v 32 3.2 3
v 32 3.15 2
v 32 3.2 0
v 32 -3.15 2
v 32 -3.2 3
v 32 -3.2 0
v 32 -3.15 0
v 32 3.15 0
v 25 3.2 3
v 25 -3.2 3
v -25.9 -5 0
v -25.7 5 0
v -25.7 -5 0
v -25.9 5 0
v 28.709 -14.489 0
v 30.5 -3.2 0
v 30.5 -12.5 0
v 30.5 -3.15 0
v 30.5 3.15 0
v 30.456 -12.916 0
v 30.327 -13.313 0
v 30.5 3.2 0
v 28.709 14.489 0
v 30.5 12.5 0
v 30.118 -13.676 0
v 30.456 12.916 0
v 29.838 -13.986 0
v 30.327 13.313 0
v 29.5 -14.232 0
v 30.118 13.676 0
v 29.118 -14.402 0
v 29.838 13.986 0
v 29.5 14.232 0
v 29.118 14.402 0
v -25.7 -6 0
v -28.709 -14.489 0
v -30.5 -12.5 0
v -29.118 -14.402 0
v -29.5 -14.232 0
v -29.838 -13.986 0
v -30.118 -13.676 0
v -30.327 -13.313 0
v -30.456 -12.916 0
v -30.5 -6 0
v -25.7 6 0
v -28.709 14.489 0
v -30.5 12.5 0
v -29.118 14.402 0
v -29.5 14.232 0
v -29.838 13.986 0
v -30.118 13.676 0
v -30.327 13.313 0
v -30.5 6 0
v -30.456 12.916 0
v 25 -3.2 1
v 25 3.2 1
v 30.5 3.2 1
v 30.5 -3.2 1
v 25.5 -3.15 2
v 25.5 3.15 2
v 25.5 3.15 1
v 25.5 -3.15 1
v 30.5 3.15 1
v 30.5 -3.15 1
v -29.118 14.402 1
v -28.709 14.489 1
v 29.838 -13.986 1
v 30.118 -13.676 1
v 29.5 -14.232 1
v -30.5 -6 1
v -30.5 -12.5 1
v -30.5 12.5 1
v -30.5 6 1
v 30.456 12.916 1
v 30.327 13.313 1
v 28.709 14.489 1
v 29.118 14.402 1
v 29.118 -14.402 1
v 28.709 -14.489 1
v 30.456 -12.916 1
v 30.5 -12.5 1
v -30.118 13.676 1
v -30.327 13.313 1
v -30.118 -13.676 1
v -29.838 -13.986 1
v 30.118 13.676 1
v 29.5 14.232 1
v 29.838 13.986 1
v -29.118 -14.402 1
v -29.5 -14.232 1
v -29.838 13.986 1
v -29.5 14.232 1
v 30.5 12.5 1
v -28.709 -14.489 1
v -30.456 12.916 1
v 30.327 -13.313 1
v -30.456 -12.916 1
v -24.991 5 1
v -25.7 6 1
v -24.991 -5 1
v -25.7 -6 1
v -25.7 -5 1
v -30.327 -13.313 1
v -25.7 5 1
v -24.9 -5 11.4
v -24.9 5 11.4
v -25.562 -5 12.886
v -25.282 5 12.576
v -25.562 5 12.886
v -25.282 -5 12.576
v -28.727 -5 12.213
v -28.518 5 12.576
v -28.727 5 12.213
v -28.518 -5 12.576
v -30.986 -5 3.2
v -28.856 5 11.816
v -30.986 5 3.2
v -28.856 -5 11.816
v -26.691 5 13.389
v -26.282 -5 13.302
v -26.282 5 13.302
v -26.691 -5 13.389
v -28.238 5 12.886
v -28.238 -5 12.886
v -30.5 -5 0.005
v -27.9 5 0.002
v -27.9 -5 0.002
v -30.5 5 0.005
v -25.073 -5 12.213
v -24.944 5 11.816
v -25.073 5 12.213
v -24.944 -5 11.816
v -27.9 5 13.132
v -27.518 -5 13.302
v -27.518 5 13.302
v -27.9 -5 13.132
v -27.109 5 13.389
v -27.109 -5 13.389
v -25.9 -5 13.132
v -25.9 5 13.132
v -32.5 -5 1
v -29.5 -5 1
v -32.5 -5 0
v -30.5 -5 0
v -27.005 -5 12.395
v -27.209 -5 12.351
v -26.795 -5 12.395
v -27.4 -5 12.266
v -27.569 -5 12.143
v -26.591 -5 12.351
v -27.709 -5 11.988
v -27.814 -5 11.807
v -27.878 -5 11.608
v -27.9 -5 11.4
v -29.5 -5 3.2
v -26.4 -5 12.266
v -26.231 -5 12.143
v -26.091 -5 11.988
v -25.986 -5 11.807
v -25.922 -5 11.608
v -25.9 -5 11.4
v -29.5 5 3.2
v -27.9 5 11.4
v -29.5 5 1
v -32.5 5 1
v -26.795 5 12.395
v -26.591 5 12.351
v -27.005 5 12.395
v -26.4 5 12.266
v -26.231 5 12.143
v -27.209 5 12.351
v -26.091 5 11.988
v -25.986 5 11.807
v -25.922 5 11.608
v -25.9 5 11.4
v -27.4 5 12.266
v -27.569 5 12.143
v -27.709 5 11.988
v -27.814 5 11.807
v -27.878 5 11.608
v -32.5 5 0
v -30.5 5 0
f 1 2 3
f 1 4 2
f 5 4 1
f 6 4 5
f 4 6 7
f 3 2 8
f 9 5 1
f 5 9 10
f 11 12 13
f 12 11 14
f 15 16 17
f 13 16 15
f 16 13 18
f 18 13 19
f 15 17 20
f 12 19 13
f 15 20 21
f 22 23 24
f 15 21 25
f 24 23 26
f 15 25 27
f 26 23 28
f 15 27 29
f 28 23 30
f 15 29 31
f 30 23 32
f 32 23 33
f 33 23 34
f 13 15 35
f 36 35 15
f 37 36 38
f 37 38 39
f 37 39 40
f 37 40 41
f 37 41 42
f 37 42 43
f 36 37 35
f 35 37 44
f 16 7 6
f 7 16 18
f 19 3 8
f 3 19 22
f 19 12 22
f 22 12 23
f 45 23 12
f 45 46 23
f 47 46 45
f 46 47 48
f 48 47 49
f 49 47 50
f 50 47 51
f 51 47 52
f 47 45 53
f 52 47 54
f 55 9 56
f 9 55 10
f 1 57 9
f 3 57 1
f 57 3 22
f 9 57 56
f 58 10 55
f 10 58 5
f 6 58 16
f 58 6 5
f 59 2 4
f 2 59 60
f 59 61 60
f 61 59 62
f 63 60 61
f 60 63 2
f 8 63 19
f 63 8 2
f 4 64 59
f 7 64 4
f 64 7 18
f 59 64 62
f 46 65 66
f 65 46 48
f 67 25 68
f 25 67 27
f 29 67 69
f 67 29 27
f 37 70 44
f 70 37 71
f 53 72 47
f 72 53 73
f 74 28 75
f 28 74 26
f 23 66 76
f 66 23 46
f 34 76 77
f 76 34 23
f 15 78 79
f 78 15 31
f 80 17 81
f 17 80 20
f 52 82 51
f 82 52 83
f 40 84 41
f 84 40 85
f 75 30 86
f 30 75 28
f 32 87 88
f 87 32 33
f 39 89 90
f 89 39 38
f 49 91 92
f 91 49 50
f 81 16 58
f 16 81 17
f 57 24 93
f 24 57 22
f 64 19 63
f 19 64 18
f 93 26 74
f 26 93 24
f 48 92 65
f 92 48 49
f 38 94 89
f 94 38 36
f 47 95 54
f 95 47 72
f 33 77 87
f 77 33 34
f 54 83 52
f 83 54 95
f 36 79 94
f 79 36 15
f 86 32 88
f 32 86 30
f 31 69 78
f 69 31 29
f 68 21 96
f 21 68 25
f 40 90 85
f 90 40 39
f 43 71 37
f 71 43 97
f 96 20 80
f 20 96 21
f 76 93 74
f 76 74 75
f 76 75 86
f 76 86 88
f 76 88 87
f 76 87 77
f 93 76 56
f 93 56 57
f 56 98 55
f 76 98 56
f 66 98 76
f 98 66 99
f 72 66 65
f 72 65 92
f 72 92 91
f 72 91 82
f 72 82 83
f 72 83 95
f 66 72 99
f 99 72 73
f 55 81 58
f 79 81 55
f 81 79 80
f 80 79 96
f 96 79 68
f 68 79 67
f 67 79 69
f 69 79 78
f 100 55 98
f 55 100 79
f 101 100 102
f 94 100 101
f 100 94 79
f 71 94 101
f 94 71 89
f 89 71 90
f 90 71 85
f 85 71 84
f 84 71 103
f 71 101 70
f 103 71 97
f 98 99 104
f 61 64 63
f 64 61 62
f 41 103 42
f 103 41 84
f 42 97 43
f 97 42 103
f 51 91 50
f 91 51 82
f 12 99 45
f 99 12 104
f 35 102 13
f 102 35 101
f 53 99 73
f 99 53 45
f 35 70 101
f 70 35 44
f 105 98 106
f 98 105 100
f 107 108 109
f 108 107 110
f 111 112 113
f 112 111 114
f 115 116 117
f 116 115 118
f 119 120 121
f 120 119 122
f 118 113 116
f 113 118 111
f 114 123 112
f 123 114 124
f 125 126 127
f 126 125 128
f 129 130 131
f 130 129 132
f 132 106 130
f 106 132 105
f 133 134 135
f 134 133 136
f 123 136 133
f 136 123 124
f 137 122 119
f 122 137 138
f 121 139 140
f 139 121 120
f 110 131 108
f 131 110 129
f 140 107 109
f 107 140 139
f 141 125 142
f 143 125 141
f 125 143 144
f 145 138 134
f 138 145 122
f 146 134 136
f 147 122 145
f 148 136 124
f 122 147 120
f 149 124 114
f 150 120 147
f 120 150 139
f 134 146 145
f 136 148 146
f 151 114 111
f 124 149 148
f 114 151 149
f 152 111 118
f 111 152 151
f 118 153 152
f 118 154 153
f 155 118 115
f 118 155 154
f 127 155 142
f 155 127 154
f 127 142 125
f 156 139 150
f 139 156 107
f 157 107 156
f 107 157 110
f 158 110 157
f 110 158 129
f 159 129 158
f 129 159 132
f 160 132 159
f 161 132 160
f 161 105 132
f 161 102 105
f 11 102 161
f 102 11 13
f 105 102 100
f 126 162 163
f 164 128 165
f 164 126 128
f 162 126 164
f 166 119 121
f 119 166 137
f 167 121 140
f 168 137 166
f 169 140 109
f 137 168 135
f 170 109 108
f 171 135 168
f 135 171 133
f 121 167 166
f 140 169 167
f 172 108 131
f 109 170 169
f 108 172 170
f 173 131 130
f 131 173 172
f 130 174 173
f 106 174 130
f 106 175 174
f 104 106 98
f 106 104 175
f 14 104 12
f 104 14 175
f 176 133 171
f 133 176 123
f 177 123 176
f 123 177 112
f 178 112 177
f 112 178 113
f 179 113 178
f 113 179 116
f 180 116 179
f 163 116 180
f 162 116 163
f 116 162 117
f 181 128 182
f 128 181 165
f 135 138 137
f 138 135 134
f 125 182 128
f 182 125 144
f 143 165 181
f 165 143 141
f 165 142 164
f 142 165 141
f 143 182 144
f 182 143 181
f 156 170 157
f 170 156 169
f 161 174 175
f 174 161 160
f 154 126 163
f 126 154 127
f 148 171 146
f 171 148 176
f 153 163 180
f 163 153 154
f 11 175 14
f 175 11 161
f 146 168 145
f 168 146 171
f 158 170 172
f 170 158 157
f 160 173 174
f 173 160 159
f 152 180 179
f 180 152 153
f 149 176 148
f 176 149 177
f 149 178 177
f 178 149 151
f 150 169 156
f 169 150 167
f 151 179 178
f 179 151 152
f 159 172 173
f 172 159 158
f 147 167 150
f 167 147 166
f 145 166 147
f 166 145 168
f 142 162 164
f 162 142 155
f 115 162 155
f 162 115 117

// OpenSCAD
// This thing generates custom battery covers
//
// v2.0
//
// Licenced under Creative Commons: Attribution, Share-Alike
//		http://creativecommons.org/licenses/by-sa/3.0/
// For attribution you can direct people to the original file on thingiverse:
// 		http://www.thingiverse.com/thing:243269

// ================ variables

//CUSTOMIZER VARIABLES

/* [Basic] */

// how long the battery cover is.  (This dimension is in the clip-to-ears direction.)
length=57; // 10:200

// how wide the battery cover is
width=25; // 10:200

// how thick the battery cover is
thickness=0.5;  // 0.1:10

// radius for rounding over the corners of the battery cover
corner_radius=2;  // 0:10

// how thick the case plastic is
case_thickness=2;

// for generating support material.  Can be 0.
support_thickness=0.05;

/* [Ears] */

// how wide the ear tabs are
ear_width=6.4;  // 2:25

// how wide the ear tabs are
ear_length=6.5;  // 2:25

// how far apart the ear tabs are.  (To create one wide tab, just set this to 0.)
ear_spacing=0;  // 1:100

// How thick the case is where the ears attach.  Usually it should be the same as "thickness" on the "basic" tab
ear_case_thickness=1.75;  // 0.1:10

/* [Clip] */

// How wide the clip is
clip_width=10; // 5:50

// How deep the clip is (overhang)
clip_depth=2;

// How long the clip is
clip_length=5.8; // 5.8

// This is used for a side-engagement clip.  Most clips are this way now.  It measures how wide the small part of the clip is.
clip_width_sides=10;

// This is for a front-engagement clip.  If unused, set it to 0, otherwise, how long the catch will be (usually about 2-3mm)
clip_length_catch=0;

// How far the clip is in/out relative to the edge of the battery cover.
//clip_indent=0;  // -15:15

// This is how far down into the battery case the clip engages.  Usually it should be the same as "thickness" on the "basic" tab
clip_case_thickness=3.2;  // 0.1:10

// The thickness of the finger tab
tab_thickness=1;

/* [Gussets] */

// Which direction the support gussets go
gusset_orientation=0; // [0:clip_lengthwise,1:clip_widthwise]

// How thick the gussets are (set to 0 to turn off gussets)
gusset_thickness=0;

// How high the gussets are
gusset_height=0;

// How far apart the gussets are
gusset_spacing=0;

/* [Advanced] */

// Resolution
$fn=30;

/* [hidden] */

scoche=0.01;
halfscoche=scoche/2;

render(convexity=3)
cover(width,length,thickness,case_thickness,gusset_thickness,corner_radius,ear_width,ear_spacing,clip_width,clip_width_sides,clip_length,clip_length_catch,clip_case_thickness,ear_length,tab_thickness);

module clip(clip_width=15,clip_width_sides=10,clip_length=1,clip_case_thickness=5,clip_length_catch=3,tab_thickness=3) {
	top_r=2;
	top_r_x=3.6;
	top_r_y=10.4;
	inside_corner_x=5;
	overlap_tab_w=2;
	inside_void_d1=2;
	inside_void_d2=2;
	inside_void_x=3.6;
	
	rotate([90,0,0]){
		difference () {
			union(){ // the outside shape
				hull () {
					translate([0,0,0]) cylinder(r=1,h=clip_width); // outside radius
					translate([inside_corner_x-1/2,-1,0]) cube([1,1,clip_width]); // inside corner
					translate([top_r_x,top_r_y,0]) cylinder(r=top_r,h=clip_width); // top
					if(clip_length_catch>0){
						translate([-clip_length_catch+0.1,clip_case_thickness,0]) cylinder(r=0.1,h=clip_width); // add a front overhang
					}
				}
				translate([-overlap_tab_w,-1,0]) cube([overlap_tab_w,tab_thickness,clip_width]); // the overlap tab
			}
			union(){ 
				translate([inside_void_x,0,0]) hull() { // The inside void
					translate([0,10.4,-clip_width/2]) cylinder(r=inside_void_d1/2,h=clip_width*2);
					translate([-inside_void_d2/2,-tab_thickness-scoche,-clip_width/2]) cube([inside_void_d2,scoche,clip_width*2]);
				}
				// trim the tab overhang
				translate([-tab_thickness-clip_depth,0,-clip_width/2]) cube([clip_depth*2,clip_case_thickness-tab_thickness,clip_width*2]); // trim off outside
				// trim the tab width
				translate([-2-halfscoche,-2,-(clip_width-clip_width_sides)/2]) cube([5+scoche,clip_case_thickness,(clip_width-clip_width_sides)]); // trim off left side
				translate([-2-halfscoche,-2,clip_width-(clip_width-clip_width_sides)/2]) cube([5+scoche,clip_case_thickness,(clip_width-clip_width_sides)]); // trim off right side
			}
		}
	}
}

module cover(width=30,length=60,thickness=0.5,case_thickness=3.9,gusset_thickness=4.5,corner_radius=1,ear_width=7.5,ear_spacing=29,clip_width=15,clip_width_sides=10,clip_length=1,clip_length_catch=3,clip_case_thickness=5,ear_length=5.8,tab_thickness=3) {
	clip_thickness=1;
	difference(){
		// the base shape
		union(){
			// the face
			translate([-length/2,-width/2,0]) 
			minkowski(){
				cube([length,width,thickness]);
				if(corner_radius>0) cylinder(r=corner_radius,h=thickness);
			}
			// gussets
			translate([8.1,0,0]) cube([54.8,1.6,gusset_thickness]);
			translate([8.1,64.4,0]) cube([54.8,1.6,gusset_thickness]);
			
			difference(){// the ears
				union(){
					translate([(length-ear_length-thickness)/2,(ear_spacing/2)-(ear_width/2),0]) cube([ear_length+thickness,ear_width,case_thickness+thickness*2]);
					translate([(length-ear_length-thickness)/2,(-ear_spacing/2)+(-ear_width/2),0]) cube([ear_length+thickness,ear_width,case_thickness+thickness*2]);
				}	
				translate([(length-ear_length+thickness)/2,(ear_spacing/2)-(ear_width/2)+support_thickness,0]) cube([ear_length,ear_width-support_thickness*2,case_thickness]);
				translate([(length-ear_length+thickness)/2,(-ear_spacing/2)+(-ear_width/2)+support_thickness,0]) cube([ear_length,ear_width-support_thickness*2,case_thickness]);
			}
		}
		union(){
			// hole for clip
			translate([(-length/2)-corner_radius,-clip_width/2-1,-scoche]) cube([clip_length-clip_thickness,clip_width+2,thickness*2+scoche]); // the hole for the clip
			// cutout for ears
		}
	}
	// the clip itsself
	translate([(-length/2)-corner_radius,clip_width/2,1]) clip(clip_width,clip_width_sides,clip_length,clip_case_thickness,clip_length_catch,tab_thickness);
}
